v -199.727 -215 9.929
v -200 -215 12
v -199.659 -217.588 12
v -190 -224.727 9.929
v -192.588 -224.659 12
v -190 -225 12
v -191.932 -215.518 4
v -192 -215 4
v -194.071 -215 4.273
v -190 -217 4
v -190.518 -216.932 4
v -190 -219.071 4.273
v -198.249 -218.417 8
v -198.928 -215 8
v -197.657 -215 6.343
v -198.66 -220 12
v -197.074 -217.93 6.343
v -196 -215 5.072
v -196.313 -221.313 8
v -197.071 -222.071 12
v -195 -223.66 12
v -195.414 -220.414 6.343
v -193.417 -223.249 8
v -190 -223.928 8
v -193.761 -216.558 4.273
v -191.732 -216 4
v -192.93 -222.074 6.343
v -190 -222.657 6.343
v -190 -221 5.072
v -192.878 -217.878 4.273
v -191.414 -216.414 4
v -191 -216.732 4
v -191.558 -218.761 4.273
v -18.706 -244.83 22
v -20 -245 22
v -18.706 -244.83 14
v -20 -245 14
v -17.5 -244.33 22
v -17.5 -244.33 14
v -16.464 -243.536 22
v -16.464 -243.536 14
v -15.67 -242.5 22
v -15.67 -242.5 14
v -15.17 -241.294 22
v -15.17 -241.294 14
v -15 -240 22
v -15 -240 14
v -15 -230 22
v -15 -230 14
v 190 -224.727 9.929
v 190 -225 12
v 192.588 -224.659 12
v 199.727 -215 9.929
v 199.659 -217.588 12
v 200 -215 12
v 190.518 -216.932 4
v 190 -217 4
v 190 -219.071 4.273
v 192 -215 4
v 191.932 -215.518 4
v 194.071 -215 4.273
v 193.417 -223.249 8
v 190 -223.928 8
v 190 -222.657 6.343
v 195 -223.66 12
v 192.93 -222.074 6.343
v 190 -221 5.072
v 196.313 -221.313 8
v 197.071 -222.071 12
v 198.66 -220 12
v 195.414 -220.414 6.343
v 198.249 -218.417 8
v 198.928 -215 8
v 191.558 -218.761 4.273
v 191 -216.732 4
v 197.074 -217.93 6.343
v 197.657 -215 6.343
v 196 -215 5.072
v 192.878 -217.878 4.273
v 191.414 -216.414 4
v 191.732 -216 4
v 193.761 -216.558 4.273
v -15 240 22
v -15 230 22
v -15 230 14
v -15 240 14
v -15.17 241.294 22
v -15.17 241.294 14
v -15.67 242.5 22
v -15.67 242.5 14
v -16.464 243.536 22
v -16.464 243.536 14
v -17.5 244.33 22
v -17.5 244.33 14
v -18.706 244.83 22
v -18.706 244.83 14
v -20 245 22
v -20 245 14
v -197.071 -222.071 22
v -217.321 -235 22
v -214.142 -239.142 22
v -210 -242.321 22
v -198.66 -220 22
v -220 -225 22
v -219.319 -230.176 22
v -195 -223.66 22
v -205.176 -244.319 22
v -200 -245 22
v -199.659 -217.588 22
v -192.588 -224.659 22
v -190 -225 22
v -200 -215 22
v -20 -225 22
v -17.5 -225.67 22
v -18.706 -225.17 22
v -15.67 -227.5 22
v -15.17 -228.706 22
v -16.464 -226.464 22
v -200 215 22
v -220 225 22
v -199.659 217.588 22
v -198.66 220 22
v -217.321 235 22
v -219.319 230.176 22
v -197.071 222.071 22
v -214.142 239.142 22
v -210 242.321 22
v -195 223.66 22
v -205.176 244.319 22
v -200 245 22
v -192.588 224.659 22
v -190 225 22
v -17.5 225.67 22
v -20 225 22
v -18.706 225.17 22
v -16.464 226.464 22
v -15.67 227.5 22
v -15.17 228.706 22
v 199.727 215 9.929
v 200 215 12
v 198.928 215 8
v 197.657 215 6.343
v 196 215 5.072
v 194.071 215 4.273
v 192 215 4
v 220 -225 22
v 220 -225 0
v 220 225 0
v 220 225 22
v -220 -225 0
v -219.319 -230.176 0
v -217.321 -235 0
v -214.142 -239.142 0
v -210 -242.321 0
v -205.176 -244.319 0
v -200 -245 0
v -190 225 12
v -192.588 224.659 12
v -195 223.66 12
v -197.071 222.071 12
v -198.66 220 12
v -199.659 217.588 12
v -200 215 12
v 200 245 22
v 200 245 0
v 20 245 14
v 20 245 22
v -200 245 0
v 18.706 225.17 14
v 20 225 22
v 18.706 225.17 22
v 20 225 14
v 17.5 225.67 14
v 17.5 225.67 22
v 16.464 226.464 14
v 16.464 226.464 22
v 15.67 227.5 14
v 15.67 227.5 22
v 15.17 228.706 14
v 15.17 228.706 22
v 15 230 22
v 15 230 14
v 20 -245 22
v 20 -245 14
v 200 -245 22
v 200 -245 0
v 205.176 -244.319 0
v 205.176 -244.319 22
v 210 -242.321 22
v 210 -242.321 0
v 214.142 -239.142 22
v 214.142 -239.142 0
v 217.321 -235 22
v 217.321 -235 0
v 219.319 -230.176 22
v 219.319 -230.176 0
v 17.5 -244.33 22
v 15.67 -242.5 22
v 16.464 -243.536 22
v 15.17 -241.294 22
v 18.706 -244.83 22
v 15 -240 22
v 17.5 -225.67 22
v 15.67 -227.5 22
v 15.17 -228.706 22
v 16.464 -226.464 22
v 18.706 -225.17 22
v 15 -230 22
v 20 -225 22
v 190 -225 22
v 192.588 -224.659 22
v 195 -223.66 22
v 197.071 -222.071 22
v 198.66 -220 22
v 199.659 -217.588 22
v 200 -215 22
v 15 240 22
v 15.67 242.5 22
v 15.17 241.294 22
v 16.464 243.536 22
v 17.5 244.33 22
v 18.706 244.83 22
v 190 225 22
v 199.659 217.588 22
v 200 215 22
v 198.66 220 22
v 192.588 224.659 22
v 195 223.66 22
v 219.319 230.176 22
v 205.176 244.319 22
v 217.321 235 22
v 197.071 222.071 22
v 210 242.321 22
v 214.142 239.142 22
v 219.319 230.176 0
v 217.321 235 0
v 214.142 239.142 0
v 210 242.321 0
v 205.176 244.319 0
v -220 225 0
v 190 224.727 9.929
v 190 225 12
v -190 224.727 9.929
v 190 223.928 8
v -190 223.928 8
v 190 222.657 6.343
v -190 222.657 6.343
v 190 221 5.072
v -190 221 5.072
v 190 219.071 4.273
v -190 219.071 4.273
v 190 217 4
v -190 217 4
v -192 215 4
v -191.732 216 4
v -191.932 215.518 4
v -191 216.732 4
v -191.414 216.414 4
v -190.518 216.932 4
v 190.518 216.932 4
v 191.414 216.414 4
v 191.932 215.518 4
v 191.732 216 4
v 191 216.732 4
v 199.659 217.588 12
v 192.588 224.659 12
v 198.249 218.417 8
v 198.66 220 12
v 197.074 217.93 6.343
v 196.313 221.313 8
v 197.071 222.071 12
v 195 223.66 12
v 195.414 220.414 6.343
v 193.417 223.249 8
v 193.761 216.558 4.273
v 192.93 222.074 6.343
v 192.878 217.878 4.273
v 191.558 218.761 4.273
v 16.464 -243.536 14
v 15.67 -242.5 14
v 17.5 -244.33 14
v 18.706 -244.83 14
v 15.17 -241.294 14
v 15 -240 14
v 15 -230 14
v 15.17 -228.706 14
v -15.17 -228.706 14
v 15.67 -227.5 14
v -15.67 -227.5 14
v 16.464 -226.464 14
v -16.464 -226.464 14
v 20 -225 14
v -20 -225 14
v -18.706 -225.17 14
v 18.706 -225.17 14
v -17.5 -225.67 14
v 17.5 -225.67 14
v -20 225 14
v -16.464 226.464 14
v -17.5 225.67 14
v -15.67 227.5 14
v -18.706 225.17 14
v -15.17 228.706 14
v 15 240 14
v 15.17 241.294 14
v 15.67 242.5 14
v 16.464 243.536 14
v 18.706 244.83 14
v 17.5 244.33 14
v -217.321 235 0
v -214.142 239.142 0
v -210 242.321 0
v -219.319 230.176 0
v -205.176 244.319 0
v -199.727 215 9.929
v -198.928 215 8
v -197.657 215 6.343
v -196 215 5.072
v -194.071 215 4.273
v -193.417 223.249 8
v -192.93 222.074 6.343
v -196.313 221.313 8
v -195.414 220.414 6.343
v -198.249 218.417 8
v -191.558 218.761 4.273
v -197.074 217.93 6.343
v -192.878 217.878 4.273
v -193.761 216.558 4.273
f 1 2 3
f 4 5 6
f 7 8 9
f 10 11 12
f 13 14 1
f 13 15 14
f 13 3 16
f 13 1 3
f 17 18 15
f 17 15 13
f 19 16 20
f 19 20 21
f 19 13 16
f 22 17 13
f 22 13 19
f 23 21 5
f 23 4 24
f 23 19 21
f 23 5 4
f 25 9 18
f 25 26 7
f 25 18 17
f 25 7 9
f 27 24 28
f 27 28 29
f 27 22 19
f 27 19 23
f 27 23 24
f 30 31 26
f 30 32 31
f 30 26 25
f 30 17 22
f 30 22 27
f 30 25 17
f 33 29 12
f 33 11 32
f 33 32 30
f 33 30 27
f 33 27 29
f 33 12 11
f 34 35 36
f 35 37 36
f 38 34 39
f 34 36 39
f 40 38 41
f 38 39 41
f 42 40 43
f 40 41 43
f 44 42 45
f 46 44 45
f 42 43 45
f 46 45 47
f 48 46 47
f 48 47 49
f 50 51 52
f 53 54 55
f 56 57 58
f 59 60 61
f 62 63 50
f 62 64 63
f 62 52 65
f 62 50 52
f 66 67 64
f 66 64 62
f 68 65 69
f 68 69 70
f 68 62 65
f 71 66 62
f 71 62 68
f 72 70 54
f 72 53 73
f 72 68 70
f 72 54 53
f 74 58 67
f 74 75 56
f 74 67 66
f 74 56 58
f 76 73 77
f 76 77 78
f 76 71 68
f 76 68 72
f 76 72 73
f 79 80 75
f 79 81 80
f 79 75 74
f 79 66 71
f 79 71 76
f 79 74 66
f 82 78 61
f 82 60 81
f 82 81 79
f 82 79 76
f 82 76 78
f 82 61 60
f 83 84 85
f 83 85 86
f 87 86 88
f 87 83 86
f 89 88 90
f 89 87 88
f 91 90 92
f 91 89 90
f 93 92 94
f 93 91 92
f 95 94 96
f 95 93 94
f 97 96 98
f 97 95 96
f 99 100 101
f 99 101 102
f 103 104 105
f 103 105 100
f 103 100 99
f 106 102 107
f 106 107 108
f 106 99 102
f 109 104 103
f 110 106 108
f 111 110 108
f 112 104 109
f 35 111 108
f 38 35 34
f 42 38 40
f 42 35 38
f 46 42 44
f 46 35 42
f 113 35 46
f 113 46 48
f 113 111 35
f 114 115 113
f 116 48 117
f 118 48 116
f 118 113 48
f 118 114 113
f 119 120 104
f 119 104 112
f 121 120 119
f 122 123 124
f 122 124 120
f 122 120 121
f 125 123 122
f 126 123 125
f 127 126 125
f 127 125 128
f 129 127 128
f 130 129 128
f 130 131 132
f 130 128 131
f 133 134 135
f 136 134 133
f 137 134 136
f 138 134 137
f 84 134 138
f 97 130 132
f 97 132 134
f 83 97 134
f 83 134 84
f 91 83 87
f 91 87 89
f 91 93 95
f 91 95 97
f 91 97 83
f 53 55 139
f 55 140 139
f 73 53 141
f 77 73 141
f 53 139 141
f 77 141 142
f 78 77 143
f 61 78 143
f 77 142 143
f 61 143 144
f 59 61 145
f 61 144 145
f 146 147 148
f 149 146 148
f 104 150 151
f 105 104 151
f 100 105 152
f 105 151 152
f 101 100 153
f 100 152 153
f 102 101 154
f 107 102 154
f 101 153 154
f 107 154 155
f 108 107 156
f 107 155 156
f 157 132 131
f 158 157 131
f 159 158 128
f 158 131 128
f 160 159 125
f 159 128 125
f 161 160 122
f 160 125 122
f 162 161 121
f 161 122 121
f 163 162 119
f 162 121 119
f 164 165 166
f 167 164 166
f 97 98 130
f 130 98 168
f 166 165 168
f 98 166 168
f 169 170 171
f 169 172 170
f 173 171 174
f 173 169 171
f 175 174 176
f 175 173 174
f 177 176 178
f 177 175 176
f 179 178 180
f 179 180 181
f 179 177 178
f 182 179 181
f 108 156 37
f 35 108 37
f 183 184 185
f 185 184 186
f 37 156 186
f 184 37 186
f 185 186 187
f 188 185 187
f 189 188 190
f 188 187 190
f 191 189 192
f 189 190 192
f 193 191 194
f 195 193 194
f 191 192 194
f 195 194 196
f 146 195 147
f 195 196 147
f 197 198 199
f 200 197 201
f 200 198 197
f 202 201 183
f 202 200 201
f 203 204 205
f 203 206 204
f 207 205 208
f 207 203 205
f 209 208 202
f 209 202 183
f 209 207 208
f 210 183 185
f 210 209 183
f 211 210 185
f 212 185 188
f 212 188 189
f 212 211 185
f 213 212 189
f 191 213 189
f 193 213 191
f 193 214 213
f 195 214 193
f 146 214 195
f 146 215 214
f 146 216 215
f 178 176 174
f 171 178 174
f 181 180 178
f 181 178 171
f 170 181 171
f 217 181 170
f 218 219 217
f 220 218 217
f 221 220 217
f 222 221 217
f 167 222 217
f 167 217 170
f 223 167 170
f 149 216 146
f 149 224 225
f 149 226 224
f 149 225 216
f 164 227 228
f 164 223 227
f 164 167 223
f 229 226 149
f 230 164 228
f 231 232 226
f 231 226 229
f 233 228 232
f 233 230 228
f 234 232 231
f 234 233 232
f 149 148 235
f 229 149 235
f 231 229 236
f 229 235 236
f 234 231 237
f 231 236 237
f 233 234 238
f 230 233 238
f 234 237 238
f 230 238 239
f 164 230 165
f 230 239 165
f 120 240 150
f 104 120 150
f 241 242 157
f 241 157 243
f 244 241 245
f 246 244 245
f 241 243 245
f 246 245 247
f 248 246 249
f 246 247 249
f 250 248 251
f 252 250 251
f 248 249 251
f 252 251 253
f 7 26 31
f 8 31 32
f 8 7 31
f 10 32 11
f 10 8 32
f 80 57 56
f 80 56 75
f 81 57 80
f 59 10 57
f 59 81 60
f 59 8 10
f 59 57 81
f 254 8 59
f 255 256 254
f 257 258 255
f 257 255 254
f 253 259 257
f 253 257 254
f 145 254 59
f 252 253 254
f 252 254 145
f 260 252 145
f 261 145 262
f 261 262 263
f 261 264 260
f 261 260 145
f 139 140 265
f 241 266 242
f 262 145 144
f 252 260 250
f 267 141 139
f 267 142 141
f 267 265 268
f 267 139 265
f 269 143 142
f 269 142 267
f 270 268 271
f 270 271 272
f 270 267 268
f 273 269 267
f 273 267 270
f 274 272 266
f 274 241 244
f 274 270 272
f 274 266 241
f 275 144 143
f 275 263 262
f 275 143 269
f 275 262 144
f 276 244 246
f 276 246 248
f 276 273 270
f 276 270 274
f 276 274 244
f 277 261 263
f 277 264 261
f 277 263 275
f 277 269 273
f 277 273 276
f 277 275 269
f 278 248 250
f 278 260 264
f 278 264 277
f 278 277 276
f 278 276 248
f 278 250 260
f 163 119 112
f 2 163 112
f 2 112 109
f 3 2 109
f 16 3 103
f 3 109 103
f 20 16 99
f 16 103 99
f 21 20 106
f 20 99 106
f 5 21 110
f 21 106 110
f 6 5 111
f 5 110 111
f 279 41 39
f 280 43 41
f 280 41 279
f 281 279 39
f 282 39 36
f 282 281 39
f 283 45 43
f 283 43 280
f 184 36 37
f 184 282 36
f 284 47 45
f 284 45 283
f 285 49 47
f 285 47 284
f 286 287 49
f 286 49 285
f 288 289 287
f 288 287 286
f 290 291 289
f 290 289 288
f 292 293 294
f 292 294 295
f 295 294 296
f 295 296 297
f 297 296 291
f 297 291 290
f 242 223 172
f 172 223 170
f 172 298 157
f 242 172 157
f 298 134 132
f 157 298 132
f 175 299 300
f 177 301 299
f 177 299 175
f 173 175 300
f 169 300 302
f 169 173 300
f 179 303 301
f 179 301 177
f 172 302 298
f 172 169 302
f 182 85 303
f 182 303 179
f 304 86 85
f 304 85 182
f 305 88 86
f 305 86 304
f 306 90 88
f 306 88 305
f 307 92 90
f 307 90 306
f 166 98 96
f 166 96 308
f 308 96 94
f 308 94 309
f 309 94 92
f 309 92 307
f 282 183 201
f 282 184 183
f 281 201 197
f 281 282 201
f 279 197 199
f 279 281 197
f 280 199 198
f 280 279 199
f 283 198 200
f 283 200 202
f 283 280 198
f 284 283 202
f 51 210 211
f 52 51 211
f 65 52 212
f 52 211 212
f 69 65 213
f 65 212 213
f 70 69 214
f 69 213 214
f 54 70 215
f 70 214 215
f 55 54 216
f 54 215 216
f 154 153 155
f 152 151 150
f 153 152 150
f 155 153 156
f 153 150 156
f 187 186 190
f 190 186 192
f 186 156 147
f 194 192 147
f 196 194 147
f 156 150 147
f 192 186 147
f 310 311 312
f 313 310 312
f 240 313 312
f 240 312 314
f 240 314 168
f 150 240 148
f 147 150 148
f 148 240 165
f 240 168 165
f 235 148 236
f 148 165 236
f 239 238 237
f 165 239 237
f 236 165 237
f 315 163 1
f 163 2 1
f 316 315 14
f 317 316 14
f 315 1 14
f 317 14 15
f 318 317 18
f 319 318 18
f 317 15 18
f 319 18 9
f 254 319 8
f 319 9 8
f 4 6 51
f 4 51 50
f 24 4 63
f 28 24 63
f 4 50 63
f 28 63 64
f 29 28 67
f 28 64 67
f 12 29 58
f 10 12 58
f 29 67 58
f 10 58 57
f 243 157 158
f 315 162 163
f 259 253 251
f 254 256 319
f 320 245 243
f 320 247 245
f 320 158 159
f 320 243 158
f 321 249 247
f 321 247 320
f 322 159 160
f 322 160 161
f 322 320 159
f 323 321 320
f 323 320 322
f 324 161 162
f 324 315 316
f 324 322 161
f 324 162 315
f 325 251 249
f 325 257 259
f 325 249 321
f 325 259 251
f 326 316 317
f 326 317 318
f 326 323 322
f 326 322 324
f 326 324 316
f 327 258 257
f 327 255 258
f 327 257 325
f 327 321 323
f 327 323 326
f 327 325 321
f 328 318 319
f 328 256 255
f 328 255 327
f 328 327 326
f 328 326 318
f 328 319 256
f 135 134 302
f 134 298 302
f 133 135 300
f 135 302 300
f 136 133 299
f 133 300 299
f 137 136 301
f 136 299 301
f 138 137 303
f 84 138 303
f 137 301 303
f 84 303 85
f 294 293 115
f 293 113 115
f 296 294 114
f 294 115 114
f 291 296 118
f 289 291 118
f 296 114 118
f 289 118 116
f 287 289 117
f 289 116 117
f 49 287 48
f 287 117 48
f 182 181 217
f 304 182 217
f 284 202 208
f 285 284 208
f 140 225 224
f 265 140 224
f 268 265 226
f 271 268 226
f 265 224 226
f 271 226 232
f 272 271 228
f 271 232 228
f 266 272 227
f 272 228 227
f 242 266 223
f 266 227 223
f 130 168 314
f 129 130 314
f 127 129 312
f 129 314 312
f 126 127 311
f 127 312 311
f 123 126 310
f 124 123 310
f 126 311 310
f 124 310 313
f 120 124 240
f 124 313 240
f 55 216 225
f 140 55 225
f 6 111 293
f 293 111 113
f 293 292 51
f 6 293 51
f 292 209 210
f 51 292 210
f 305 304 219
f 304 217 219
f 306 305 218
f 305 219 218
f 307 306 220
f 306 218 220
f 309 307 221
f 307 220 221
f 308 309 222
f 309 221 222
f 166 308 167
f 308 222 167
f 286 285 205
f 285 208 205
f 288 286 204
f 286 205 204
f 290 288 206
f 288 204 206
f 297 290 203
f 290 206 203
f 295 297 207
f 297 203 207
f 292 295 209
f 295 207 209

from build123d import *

# Parameters (mm, degrees)
F1_DEPTH = 22
F3_DEPTH = 18
F4_R     = 8
F5_W     = 30
F5_H     = 597.1070975065
F6_DEPTH = 8
F7_R     = 5


with BuildPart() as f1:
    # F0 (on Top) → F1 (new body)
    with BuildSketch(Plane.XY):
        with BuildLine():
            Line((200, 245), (0, 245))
            Line((0, 245), (-200, 245))
            ThreePointArc((-200, 245), (-214.1421356237, 239.1421356237), (-220, 225))
            Line((-220, 225), (-220, 0))
            Line((-220, 0), (-220, -225))
            ThreePointArc((-220, -225), (-214.1421356237, -239.1421356237), (-200, -245))
            Line((-200, -245), (0, -245))
            Line((0, -245), (200, -245))
            ThreePointArc((200, -245), (214.1421356237, -239.1421356237), (220, -225))
            Line((220, -225), (220, 0))
            Line((220, 0), (220, 225))
            ThreePointArc((220, 225), (214.1421356237, 239.1421356237), (200, 245))
        make_face()
    extrude(amount=F1_DEPTH)

    # F2 (on face) → F3 (cut)
    with BuildSketch(Plane.XY.offset(22)):
        with BuildLine():
            Line((190, 225), (-190, 225))
            ThreePointArc((-190, 225), (-197.0710678119, 222.0710678119), (-200, 215))
            Line((-200, 215), (-200, -215))
            ThreePointArc((-200, -215), (-197.0710678119, -222.0710678119), (-190, -225))
            Line((-190, -225), (190, -225))
            ThreePointArc((190, -225), (197.0710678119, -222.0710678119), (200, -215))
            Line((200, -215), (200, 215))
            ThreePointArc((200, 215), (197.0710678119, 222.0710678119), (190, 225))
        make_face()
    extrude(amount=-F3_DEPTH, mode=Mode.SUBTRACT)

    # F4
    f4_edges = [f1.edges().sort_by_distance(p)[0] for p in [
        (0, 225, 4),
        (-197.071068, 222.071068, 4),
        (-200, 0, 4),
        (-197.071068, -222.071068, 4),
        (0, -225, 4),
        (197.071068, -222.071068, 4),
        (200, 0, 4),
        (197.071068, 222.071068, 4),
    ]]
    fillet(f4_edges, radius=F4_R)

    # F5 (on face) → F6 (cut)
    with BuildSketch(Plane.XY.offset(22)):
        with Locations((0, -8.4120258689)):
            Rectangle(F5_W, F5_H)
    extrude(amount=-F6_DEPTH, mode=Mode.SUBTRACT)

    # F7
    f7_edges = [f1.edges().sort_by_distance(p)[0] for p in [
        (-15, -245, 18),
        (15, -245, 18),
        (15, -225, 18),
        (-15, -225, 18),
        (-15, 225, 18),
        (-15, 245, 18),
        (15, 225, 18),
        (15, 245, 18),
    ]]
    fillet(f7_edges, radius=F7_R)


solid = f1.part
